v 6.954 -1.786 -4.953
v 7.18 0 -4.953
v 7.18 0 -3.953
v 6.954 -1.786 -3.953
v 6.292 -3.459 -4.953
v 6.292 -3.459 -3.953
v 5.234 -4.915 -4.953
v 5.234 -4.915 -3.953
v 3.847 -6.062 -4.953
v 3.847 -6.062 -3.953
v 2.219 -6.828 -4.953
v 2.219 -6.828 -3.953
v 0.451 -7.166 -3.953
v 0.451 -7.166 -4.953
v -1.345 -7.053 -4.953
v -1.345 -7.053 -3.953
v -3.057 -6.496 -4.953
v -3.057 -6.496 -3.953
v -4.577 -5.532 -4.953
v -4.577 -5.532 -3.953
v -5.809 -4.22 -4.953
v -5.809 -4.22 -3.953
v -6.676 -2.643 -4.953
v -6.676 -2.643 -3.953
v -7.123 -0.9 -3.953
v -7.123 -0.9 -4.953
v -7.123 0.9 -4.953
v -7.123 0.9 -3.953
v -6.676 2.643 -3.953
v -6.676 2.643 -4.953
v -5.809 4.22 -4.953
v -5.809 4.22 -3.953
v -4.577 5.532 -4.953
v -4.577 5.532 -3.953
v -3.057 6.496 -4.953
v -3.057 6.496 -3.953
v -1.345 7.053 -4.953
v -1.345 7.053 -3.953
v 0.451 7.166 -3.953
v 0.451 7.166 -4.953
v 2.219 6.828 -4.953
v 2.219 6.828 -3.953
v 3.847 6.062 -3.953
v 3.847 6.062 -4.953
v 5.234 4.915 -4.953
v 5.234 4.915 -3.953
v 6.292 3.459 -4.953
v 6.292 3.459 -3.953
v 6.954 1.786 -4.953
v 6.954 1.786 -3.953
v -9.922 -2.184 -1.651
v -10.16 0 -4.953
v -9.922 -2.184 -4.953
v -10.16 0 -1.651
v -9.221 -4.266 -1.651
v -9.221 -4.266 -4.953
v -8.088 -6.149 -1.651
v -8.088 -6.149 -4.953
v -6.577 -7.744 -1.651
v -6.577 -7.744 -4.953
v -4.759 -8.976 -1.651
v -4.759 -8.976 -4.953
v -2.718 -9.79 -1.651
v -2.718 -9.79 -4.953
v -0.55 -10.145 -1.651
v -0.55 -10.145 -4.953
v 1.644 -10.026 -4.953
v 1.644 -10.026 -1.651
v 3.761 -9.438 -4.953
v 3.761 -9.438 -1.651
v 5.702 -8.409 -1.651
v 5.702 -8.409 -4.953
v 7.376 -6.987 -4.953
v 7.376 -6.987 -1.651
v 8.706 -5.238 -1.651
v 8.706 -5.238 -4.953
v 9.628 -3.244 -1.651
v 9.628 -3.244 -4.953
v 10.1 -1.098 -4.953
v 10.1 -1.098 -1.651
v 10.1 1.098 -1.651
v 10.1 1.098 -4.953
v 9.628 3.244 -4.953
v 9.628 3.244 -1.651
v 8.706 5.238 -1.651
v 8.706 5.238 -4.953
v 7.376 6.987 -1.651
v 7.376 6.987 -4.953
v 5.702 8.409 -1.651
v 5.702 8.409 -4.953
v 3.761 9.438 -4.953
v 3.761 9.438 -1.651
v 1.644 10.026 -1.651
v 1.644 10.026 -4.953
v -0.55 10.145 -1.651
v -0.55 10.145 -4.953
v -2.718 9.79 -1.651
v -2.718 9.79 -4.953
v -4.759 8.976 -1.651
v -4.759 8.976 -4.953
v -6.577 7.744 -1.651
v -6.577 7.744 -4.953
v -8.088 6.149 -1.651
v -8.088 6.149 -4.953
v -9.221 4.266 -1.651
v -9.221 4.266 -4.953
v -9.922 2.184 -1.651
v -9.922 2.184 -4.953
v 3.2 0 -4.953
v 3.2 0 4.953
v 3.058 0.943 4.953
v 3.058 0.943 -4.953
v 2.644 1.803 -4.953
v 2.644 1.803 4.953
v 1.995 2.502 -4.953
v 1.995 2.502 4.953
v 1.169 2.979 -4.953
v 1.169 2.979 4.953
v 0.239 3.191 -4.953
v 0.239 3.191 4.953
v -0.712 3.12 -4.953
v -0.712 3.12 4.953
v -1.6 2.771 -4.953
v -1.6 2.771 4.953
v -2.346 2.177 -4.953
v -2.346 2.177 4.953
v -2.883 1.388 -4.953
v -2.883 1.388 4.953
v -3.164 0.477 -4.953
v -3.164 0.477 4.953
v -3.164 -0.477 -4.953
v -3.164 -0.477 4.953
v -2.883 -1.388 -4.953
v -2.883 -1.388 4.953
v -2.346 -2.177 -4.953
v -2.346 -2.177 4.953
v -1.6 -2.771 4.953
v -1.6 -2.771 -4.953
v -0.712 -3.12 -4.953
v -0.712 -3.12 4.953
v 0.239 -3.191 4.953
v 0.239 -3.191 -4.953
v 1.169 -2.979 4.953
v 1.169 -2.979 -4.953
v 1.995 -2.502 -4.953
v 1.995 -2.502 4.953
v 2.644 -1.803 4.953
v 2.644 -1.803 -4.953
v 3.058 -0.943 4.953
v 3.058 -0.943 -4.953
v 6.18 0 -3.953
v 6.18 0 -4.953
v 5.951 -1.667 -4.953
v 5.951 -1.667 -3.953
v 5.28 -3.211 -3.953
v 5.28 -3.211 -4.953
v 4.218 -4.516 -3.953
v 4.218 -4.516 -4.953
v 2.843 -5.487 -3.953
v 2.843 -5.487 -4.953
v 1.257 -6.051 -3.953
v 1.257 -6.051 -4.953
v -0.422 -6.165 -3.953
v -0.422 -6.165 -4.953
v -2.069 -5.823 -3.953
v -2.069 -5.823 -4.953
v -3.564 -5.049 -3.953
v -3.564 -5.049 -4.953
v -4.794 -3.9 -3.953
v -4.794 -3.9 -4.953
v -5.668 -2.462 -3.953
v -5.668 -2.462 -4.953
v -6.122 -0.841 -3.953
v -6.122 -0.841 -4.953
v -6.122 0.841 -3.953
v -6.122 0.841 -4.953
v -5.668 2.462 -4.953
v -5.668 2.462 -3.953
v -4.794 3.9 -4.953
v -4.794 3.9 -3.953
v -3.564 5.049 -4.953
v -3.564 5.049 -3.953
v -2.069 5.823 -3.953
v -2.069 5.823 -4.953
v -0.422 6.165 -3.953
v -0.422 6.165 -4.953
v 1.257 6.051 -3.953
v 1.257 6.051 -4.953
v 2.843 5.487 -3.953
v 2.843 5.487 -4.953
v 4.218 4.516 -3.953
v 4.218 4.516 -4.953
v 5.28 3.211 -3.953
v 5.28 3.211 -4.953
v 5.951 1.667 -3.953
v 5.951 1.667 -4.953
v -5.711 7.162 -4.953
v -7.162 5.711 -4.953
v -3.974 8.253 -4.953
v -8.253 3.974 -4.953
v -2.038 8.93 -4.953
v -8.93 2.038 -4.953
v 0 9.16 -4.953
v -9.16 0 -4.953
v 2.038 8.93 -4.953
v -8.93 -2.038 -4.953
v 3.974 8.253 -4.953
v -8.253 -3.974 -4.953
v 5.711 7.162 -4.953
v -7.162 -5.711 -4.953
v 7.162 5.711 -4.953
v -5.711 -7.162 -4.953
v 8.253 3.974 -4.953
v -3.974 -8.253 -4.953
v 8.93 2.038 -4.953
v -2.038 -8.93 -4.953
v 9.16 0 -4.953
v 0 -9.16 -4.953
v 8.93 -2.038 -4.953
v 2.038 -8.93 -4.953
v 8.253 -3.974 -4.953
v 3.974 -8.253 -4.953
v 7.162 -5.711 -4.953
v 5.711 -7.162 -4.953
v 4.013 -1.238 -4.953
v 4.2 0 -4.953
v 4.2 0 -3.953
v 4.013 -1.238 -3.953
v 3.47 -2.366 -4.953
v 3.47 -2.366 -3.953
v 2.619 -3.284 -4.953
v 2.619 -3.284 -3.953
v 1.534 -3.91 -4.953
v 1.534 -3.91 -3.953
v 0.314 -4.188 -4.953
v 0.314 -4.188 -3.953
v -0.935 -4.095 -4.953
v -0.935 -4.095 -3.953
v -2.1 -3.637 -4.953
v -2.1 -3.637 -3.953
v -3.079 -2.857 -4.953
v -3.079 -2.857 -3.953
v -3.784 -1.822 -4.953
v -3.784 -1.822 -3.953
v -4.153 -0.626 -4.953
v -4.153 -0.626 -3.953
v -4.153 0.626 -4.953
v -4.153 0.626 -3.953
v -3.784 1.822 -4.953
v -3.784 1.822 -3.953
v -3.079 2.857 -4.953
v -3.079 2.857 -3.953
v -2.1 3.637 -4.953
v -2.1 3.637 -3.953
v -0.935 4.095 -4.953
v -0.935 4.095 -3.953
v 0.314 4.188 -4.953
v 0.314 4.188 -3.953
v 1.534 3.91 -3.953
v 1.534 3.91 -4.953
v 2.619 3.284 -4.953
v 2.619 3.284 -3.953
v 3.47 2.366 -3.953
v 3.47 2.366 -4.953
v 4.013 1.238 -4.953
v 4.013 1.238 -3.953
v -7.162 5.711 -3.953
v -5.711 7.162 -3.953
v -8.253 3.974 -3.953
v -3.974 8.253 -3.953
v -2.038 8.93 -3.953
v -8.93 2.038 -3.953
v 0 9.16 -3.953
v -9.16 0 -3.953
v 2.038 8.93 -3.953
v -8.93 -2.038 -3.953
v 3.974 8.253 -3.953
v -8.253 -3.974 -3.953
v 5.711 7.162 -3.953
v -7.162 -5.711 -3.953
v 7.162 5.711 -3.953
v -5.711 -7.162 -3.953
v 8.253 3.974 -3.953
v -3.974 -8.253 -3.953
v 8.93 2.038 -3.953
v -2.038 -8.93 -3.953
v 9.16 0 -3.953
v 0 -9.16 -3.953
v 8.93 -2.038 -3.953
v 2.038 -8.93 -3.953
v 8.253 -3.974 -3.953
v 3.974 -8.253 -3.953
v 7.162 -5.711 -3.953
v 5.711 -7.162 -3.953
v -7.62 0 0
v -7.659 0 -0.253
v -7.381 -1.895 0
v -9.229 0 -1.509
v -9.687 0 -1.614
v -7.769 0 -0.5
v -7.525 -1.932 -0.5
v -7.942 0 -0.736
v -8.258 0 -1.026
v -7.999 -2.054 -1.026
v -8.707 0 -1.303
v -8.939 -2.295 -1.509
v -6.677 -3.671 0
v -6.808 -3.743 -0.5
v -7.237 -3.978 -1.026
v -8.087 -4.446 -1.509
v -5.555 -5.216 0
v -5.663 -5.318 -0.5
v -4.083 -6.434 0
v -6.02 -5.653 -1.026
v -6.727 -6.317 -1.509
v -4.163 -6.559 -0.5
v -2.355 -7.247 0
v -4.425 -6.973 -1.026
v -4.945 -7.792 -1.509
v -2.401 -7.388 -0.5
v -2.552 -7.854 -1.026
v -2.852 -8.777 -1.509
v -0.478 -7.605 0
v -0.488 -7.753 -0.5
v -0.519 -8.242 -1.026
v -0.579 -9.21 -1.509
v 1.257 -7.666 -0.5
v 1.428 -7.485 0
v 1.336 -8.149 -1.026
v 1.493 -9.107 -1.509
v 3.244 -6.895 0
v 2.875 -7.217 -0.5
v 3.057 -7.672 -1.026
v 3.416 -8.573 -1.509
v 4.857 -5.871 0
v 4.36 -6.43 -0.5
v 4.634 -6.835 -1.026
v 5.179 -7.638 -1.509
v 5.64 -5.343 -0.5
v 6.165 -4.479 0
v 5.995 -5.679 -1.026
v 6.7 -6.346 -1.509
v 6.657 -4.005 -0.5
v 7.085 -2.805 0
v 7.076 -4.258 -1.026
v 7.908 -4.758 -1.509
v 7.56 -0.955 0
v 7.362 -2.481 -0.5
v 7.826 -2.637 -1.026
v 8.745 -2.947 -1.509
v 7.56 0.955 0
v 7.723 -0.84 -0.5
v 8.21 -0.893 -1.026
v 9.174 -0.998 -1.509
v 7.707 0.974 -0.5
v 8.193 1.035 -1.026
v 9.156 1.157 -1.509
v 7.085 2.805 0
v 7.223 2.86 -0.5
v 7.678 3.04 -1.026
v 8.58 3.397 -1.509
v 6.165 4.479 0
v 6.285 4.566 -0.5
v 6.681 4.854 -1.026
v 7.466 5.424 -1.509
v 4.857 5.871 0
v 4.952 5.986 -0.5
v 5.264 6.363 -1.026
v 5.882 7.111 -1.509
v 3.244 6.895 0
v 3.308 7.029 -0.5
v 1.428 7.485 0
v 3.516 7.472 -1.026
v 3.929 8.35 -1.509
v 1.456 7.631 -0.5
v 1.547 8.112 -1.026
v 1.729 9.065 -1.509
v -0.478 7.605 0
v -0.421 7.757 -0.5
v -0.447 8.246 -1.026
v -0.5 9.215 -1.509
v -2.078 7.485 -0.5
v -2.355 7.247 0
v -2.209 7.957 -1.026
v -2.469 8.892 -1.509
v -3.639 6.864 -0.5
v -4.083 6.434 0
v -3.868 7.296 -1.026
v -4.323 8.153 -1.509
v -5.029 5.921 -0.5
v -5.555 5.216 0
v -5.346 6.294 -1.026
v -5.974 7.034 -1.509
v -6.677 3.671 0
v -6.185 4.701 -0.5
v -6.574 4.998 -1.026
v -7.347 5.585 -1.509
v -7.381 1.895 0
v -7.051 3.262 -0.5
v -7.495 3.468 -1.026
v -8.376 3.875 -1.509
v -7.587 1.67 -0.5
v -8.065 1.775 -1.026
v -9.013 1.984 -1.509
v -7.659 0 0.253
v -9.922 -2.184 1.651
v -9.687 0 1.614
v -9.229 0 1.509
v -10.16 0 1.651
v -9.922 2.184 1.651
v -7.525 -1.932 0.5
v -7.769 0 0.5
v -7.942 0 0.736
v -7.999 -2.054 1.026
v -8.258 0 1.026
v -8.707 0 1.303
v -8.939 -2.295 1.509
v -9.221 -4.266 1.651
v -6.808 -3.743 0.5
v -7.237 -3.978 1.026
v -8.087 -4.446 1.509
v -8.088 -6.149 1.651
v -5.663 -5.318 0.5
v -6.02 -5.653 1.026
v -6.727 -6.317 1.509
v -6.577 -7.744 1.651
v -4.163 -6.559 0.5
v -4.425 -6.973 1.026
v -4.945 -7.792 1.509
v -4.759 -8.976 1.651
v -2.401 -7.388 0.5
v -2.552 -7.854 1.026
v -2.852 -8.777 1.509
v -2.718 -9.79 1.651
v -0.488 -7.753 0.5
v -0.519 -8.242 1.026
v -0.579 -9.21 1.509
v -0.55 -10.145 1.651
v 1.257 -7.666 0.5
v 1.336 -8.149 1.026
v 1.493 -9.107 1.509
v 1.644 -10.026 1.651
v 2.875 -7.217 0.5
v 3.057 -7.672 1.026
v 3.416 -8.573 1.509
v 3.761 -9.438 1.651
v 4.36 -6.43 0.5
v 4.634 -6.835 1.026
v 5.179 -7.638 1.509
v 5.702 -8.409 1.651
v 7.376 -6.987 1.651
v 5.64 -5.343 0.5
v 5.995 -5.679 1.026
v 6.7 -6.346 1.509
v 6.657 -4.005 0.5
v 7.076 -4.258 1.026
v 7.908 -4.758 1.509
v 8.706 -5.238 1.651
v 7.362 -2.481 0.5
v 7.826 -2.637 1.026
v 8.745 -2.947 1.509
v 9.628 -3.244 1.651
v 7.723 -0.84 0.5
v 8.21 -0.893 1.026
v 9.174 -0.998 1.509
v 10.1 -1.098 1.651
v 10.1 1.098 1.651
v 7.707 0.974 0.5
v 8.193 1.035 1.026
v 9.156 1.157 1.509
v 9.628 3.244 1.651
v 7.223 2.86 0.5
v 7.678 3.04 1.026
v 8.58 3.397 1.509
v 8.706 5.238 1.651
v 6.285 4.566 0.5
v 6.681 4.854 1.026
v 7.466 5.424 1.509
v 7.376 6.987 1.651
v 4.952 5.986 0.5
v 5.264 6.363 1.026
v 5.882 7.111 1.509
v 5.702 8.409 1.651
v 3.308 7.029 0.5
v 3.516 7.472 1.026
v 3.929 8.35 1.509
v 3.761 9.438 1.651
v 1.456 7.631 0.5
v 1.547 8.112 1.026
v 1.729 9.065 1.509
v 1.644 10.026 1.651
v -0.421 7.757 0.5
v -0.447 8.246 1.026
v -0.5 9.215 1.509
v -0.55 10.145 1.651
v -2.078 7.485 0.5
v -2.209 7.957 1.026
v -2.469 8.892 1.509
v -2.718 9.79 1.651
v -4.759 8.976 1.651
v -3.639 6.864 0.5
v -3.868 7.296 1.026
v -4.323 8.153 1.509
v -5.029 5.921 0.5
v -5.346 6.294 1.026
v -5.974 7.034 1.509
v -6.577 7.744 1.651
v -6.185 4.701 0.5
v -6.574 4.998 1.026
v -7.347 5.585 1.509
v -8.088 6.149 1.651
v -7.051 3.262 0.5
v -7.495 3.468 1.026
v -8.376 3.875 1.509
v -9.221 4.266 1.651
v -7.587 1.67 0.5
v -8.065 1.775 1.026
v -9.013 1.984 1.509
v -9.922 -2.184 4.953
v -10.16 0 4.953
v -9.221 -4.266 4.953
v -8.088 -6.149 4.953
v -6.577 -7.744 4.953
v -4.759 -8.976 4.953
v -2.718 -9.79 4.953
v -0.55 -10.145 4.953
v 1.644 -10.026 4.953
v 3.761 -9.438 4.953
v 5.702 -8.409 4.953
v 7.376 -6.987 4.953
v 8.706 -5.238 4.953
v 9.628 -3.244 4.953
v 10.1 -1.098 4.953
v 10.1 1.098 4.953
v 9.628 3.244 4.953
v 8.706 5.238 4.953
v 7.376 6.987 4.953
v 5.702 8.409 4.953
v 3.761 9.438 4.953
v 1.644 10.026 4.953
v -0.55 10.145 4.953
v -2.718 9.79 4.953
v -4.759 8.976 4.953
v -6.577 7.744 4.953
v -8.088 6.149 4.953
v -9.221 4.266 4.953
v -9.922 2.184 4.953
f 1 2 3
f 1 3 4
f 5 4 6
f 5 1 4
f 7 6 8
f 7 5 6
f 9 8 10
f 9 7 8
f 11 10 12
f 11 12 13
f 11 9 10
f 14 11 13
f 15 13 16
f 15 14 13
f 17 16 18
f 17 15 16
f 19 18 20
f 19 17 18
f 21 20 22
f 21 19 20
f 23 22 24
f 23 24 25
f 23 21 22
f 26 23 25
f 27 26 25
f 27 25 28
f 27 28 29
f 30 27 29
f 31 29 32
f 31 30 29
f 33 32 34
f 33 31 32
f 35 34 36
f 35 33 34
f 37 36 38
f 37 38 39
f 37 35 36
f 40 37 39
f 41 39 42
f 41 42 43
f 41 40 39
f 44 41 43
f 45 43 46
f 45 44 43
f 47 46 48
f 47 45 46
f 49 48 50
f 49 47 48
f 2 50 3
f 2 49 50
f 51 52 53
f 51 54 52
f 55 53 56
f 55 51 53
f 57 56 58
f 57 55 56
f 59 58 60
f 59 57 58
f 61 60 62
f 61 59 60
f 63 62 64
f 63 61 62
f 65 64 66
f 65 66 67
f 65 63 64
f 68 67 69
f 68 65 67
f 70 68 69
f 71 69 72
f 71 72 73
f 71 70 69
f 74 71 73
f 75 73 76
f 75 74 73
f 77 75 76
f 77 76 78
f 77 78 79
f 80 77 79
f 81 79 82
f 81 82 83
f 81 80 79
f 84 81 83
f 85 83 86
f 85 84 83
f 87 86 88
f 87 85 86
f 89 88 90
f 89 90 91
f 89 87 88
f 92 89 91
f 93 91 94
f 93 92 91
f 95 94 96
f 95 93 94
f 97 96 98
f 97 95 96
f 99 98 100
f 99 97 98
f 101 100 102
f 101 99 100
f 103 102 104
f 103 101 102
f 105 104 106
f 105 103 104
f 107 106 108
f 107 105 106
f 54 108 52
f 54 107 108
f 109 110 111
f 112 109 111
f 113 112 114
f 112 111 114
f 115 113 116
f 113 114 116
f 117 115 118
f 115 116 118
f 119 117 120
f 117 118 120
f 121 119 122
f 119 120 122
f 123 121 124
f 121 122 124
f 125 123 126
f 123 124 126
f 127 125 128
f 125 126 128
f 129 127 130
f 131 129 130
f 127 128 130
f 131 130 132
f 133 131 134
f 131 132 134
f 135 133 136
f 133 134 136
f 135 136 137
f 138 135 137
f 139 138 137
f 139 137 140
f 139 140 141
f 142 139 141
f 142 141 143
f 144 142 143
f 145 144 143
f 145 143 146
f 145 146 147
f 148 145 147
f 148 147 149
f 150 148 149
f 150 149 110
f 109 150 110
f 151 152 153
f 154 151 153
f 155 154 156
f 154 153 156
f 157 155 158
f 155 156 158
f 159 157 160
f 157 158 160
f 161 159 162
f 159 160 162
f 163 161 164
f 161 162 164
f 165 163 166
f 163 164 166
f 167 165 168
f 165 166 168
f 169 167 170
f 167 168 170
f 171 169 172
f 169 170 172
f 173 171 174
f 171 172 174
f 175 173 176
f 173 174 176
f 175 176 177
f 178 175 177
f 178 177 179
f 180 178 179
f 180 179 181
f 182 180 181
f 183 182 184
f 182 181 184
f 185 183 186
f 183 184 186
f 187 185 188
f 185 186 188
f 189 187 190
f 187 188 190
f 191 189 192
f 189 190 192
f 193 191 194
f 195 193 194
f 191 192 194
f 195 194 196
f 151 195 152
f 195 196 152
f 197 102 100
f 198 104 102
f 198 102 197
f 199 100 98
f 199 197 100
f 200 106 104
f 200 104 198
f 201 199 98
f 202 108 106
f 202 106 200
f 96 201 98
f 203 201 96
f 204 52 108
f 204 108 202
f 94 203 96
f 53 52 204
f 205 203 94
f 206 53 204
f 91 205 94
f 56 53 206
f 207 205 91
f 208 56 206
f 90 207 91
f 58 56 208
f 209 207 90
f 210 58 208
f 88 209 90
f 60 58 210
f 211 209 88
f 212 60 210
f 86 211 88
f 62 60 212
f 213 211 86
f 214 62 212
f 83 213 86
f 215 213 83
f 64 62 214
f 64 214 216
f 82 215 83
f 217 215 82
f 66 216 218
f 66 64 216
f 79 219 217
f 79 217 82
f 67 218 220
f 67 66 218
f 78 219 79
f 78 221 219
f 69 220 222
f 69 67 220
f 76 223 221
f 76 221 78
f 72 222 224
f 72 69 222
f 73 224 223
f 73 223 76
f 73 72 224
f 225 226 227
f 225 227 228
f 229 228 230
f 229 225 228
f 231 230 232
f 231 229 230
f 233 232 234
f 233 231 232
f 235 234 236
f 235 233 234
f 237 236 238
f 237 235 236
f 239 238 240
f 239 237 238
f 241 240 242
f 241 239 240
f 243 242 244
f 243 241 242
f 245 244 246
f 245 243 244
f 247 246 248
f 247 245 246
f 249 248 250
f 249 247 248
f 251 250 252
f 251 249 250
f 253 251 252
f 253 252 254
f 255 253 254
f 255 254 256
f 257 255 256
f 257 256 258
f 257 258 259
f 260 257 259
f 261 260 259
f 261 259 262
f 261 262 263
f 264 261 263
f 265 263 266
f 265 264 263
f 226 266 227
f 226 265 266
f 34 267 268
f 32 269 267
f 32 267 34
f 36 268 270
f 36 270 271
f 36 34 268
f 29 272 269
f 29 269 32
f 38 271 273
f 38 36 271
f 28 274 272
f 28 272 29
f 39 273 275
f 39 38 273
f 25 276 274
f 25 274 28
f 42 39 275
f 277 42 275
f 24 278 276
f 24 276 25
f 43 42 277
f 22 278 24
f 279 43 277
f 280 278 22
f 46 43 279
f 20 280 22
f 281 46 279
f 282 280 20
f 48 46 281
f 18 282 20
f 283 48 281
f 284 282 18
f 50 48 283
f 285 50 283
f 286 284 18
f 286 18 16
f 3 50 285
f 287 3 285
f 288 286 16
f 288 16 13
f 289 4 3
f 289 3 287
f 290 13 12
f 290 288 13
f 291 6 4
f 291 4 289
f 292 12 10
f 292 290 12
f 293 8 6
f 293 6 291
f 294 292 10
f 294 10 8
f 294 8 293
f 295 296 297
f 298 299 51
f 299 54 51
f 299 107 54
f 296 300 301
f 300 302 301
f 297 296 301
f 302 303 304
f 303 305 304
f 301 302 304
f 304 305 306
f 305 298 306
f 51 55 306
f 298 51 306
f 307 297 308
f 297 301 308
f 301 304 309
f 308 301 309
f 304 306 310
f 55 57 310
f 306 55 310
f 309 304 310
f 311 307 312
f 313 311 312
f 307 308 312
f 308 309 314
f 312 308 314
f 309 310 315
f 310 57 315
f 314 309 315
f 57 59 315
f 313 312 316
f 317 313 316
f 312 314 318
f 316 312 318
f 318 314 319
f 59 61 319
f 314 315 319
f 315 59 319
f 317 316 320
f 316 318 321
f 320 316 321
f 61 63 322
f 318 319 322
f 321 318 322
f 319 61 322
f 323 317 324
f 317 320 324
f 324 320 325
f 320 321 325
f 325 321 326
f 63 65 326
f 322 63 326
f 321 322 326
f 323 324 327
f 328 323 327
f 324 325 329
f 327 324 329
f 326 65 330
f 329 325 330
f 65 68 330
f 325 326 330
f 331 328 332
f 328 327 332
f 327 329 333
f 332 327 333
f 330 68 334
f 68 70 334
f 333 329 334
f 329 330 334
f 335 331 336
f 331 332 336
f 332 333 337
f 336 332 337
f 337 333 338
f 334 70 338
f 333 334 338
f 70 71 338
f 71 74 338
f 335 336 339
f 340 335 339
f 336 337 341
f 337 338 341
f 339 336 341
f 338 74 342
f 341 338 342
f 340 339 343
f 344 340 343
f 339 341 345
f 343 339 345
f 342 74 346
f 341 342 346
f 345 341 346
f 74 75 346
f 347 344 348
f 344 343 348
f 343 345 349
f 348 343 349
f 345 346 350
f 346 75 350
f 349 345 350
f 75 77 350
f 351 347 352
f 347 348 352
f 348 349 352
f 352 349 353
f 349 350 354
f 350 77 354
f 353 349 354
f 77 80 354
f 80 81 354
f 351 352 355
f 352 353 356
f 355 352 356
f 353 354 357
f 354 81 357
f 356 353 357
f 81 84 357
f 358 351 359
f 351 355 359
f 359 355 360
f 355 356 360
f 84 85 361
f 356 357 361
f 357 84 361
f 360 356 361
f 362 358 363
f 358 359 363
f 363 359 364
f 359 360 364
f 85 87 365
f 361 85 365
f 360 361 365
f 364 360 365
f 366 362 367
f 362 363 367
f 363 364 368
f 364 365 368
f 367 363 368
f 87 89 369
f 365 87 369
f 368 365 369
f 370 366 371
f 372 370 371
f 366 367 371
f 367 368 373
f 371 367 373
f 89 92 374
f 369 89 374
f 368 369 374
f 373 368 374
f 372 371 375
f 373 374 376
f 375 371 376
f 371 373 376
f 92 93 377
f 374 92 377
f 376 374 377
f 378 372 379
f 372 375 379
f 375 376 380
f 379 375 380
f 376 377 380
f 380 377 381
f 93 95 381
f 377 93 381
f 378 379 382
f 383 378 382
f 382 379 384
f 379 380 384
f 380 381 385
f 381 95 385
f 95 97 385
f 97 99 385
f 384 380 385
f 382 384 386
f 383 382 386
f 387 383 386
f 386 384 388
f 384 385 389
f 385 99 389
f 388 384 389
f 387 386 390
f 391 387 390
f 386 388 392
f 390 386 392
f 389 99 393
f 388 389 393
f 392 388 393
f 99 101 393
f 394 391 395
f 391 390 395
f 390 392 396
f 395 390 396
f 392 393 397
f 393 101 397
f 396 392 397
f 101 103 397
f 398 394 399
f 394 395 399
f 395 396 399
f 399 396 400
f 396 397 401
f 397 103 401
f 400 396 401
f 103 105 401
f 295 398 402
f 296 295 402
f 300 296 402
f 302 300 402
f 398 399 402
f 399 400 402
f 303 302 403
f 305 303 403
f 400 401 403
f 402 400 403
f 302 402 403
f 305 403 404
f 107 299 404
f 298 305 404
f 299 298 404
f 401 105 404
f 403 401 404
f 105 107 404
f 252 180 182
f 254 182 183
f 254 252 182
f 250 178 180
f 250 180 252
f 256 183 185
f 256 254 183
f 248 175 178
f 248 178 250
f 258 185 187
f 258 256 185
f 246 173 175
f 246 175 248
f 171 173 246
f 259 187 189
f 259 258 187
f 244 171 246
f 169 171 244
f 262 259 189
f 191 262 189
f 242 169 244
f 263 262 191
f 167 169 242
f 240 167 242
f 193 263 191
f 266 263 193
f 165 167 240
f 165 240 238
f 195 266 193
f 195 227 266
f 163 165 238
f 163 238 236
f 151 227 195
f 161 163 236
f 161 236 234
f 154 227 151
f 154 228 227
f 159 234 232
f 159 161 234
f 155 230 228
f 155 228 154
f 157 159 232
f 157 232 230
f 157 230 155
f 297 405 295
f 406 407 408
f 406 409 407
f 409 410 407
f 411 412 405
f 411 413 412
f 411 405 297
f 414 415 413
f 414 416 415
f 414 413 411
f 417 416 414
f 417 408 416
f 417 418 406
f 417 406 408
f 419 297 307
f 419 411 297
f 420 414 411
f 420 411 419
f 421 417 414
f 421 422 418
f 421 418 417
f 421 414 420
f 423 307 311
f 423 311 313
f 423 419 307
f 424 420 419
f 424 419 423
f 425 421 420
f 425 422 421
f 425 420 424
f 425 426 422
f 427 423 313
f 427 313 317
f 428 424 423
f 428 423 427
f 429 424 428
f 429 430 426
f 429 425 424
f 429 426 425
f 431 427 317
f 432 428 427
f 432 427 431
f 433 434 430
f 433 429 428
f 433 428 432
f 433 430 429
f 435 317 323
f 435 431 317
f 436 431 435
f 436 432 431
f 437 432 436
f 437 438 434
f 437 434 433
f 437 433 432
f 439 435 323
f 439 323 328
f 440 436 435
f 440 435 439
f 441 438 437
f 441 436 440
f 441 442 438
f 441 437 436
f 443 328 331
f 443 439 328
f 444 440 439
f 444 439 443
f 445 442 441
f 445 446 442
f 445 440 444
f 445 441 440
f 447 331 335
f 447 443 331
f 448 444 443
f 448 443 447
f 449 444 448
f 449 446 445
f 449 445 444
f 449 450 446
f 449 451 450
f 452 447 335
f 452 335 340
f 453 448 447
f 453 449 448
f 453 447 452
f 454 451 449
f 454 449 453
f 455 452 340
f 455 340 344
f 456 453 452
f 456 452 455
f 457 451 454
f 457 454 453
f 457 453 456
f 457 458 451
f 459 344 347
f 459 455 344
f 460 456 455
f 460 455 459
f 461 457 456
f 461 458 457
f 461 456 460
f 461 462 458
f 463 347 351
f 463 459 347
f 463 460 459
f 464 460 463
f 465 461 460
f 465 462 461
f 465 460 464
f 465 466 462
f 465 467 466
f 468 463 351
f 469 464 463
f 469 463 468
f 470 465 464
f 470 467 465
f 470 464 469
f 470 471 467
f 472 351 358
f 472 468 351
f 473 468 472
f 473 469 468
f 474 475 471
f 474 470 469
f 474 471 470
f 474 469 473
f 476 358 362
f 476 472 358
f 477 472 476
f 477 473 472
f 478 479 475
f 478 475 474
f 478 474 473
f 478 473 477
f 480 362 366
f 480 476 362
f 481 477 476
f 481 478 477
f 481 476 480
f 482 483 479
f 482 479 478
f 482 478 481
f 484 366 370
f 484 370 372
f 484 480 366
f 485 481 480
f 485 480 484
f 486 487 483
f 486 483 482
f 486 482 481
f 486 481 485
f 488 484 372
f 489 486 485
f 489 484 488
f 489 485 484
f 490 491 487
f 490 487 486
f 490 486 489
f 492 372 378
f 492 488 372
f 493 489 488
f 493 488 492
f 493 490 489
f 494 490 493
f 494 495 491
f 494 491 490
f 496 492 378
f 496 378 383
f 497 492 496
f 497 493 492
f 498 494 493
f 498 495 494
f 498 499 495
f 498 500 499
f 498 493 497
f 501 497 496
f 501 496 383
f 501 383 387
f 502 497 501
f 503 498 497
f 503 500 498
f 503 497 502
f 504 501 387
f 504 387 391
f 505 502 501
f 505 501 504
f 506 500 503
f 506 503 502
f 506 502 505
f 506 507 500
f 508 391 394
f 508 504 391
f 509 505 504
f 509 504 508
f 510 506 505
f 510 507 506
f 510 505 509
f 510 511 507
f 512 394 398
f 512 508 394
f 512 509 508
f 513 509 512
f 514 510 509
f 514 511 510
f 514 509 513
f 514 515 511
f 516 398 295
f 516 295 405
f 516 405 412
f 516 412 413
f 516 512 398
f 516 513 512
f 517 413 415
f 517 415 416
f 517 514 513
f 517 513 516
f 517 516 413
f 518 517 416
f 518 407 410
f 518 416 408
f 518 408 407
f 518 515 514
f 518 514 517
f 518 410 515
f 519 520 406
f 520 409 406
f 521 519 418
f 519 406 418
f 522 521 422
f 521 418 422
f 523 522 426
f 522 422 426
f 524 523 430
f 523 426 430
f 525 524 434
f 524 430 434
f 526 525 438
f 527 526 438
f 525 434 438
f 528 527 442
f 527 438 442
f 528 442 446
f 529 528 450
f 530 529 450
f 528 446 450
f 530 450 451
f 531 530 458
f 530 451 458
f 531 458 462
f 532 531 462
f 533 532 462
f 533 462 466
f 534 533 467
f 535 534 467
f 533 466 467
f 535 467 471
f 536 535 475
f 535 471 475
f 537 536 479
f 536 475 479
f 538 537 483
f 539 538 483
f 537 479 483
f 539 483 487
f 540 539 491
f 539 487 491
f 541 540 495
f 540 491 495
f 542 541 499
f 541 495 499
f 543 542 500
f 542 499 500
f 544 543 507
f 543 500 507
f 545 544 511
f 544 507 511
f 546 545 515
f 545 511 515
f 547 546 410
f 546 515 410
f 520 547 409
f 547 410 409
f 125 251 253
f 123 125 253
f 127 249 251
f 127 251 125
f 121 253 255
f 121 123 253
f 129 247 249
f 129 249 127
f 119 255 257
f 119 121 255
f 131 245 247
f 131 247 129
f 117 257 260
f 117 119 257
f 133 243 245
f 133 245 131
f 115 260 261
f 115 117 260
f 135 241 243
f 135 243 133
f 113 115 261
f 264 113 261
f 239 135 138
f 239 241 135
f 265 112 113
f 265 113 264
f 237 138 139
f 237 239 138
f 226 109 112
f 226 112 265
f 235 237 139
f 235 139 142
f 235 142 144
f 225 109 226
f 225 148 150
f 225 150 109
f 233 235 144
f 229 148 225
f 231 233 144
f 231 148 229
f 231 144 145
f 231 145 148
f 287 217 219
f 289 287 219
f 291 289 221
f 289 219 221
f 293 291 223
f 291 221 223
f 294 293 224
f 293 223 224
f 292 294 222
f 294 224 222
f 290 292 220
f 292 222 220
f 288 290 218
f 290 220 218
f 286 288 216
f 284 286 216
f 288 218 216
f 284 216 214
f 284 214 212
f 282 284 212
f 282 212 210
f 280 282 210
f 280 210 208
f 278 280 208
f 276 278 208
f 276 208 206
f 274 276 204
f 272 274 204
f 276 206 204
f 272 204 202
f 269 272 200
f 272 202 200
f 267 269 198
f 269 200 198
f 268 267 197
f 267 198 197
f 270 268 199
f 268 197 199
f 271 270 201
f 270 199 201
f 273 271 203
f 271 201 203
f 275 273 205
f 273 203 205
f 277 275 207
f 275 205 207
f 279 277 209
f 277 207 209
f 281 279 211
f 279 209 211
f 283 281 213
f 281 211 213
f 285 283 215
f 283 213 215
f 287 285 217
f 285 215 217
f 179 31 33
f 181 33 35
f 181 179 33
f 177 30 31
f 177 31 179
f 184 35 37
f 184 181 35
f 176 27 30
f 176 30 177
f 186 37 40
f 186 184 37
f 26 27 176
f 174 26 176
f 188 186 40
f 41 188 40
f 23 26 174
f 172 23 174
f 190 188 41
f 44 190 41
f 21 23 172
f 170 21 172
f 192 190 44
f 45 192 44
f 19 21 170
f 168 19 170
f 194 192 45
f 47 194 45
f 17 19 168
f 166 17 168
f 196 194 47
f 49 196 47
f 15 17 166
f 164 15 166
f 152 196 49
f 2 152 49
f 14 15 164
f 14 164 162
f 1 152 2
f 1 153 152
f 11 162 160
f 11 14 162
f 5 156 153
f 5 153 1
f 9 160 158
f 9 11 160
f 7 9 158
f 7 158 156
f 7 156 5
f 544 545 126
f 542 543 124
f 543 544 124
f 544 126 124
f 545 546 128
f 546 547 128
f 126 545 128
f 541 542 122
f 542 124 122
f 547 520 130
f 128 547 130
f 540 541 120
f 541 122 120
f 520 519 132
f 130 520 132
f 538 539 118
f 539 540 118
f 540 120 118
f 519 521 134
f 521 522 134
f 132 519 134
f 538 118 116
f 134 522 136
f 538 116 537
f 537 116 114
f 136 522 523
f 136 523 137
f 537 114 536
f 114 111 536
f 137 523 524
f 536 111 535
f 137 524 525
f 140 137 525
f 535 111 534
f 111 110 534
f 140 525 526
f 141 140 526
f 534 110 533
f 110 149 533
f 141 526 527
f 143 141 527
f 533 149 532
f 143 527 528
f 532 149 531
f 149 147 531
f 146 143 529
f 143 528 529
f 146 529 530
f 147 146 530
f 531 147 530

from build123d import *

# Parameters (mm, degrees)
F3_R     = 3.2
F4_DEPTH = 9.907
F5_R     = 9.16
F5_R_2   = 7.1798
F5_R_3   = 6.1798
F5_R_4   = 4.2
F6_DEPTH = 1


with BuildPart() as f1:
    # F0 (on Front) → F1 (revolve)
    with BuildSketch(Plane.XZ):
        Polygon((0, 0), (0, 4.953), (-10.16, 4.953), (-10.16, 1.6510004181), (-7.62, 1.6510004181), (-7.62, 0), align=None)
        with BuildLine():
            Line((-7.62, 1.6510004181), (-10.16, 1.6510004181))
            add(Edge.make_bspline(
                [(-7.62, 0), (-7.62, 0.8255002091), (-8.89, 1.6510004181), (-10.16, 1.6510004181)],
                knots=[0, 0, 0, 0, 3.0294227801, 3.0294227801, 3.0294227801, 3.0294227801], degree=3))
            Line((-7.62, 0), (-7.62, 1.6510004181))
        make_face()
    revolve(axis=Axis((0, 0, 12.7), (0, 0, 1)))

    # F2: F1 across plane


with BuildPart() as f1_1:
    add(f1.part)
    add(f1.part.mirror(Plane.XY))

    # F3 (on face) → F4 (cut, through all)
    with BuildSketch(Plane.XY.offset(4.953)):
        Circle(F3_R)
    extrude(amount=-F4_DEPTH, mode=Mode.SUBTRACT)

    # F5 (on face) → F6 (cut)
    with BuildSketch(Plane(origin=(0, 0, -4.953), x_dir=(1, 0, 0), z_dir=(0, 0, -1))):
        Circle(F5_R)
        Circle(F5_R_2, mode=Mode.SUBTRACT)
        Circle(F5_R_3)
        Circle(F5_R_4, mode=Mode.SUBTRACT)
    extrude(amount=-F6_DEPTH, mode=Mode.SUBTRACT)


solid = f1_1.part
